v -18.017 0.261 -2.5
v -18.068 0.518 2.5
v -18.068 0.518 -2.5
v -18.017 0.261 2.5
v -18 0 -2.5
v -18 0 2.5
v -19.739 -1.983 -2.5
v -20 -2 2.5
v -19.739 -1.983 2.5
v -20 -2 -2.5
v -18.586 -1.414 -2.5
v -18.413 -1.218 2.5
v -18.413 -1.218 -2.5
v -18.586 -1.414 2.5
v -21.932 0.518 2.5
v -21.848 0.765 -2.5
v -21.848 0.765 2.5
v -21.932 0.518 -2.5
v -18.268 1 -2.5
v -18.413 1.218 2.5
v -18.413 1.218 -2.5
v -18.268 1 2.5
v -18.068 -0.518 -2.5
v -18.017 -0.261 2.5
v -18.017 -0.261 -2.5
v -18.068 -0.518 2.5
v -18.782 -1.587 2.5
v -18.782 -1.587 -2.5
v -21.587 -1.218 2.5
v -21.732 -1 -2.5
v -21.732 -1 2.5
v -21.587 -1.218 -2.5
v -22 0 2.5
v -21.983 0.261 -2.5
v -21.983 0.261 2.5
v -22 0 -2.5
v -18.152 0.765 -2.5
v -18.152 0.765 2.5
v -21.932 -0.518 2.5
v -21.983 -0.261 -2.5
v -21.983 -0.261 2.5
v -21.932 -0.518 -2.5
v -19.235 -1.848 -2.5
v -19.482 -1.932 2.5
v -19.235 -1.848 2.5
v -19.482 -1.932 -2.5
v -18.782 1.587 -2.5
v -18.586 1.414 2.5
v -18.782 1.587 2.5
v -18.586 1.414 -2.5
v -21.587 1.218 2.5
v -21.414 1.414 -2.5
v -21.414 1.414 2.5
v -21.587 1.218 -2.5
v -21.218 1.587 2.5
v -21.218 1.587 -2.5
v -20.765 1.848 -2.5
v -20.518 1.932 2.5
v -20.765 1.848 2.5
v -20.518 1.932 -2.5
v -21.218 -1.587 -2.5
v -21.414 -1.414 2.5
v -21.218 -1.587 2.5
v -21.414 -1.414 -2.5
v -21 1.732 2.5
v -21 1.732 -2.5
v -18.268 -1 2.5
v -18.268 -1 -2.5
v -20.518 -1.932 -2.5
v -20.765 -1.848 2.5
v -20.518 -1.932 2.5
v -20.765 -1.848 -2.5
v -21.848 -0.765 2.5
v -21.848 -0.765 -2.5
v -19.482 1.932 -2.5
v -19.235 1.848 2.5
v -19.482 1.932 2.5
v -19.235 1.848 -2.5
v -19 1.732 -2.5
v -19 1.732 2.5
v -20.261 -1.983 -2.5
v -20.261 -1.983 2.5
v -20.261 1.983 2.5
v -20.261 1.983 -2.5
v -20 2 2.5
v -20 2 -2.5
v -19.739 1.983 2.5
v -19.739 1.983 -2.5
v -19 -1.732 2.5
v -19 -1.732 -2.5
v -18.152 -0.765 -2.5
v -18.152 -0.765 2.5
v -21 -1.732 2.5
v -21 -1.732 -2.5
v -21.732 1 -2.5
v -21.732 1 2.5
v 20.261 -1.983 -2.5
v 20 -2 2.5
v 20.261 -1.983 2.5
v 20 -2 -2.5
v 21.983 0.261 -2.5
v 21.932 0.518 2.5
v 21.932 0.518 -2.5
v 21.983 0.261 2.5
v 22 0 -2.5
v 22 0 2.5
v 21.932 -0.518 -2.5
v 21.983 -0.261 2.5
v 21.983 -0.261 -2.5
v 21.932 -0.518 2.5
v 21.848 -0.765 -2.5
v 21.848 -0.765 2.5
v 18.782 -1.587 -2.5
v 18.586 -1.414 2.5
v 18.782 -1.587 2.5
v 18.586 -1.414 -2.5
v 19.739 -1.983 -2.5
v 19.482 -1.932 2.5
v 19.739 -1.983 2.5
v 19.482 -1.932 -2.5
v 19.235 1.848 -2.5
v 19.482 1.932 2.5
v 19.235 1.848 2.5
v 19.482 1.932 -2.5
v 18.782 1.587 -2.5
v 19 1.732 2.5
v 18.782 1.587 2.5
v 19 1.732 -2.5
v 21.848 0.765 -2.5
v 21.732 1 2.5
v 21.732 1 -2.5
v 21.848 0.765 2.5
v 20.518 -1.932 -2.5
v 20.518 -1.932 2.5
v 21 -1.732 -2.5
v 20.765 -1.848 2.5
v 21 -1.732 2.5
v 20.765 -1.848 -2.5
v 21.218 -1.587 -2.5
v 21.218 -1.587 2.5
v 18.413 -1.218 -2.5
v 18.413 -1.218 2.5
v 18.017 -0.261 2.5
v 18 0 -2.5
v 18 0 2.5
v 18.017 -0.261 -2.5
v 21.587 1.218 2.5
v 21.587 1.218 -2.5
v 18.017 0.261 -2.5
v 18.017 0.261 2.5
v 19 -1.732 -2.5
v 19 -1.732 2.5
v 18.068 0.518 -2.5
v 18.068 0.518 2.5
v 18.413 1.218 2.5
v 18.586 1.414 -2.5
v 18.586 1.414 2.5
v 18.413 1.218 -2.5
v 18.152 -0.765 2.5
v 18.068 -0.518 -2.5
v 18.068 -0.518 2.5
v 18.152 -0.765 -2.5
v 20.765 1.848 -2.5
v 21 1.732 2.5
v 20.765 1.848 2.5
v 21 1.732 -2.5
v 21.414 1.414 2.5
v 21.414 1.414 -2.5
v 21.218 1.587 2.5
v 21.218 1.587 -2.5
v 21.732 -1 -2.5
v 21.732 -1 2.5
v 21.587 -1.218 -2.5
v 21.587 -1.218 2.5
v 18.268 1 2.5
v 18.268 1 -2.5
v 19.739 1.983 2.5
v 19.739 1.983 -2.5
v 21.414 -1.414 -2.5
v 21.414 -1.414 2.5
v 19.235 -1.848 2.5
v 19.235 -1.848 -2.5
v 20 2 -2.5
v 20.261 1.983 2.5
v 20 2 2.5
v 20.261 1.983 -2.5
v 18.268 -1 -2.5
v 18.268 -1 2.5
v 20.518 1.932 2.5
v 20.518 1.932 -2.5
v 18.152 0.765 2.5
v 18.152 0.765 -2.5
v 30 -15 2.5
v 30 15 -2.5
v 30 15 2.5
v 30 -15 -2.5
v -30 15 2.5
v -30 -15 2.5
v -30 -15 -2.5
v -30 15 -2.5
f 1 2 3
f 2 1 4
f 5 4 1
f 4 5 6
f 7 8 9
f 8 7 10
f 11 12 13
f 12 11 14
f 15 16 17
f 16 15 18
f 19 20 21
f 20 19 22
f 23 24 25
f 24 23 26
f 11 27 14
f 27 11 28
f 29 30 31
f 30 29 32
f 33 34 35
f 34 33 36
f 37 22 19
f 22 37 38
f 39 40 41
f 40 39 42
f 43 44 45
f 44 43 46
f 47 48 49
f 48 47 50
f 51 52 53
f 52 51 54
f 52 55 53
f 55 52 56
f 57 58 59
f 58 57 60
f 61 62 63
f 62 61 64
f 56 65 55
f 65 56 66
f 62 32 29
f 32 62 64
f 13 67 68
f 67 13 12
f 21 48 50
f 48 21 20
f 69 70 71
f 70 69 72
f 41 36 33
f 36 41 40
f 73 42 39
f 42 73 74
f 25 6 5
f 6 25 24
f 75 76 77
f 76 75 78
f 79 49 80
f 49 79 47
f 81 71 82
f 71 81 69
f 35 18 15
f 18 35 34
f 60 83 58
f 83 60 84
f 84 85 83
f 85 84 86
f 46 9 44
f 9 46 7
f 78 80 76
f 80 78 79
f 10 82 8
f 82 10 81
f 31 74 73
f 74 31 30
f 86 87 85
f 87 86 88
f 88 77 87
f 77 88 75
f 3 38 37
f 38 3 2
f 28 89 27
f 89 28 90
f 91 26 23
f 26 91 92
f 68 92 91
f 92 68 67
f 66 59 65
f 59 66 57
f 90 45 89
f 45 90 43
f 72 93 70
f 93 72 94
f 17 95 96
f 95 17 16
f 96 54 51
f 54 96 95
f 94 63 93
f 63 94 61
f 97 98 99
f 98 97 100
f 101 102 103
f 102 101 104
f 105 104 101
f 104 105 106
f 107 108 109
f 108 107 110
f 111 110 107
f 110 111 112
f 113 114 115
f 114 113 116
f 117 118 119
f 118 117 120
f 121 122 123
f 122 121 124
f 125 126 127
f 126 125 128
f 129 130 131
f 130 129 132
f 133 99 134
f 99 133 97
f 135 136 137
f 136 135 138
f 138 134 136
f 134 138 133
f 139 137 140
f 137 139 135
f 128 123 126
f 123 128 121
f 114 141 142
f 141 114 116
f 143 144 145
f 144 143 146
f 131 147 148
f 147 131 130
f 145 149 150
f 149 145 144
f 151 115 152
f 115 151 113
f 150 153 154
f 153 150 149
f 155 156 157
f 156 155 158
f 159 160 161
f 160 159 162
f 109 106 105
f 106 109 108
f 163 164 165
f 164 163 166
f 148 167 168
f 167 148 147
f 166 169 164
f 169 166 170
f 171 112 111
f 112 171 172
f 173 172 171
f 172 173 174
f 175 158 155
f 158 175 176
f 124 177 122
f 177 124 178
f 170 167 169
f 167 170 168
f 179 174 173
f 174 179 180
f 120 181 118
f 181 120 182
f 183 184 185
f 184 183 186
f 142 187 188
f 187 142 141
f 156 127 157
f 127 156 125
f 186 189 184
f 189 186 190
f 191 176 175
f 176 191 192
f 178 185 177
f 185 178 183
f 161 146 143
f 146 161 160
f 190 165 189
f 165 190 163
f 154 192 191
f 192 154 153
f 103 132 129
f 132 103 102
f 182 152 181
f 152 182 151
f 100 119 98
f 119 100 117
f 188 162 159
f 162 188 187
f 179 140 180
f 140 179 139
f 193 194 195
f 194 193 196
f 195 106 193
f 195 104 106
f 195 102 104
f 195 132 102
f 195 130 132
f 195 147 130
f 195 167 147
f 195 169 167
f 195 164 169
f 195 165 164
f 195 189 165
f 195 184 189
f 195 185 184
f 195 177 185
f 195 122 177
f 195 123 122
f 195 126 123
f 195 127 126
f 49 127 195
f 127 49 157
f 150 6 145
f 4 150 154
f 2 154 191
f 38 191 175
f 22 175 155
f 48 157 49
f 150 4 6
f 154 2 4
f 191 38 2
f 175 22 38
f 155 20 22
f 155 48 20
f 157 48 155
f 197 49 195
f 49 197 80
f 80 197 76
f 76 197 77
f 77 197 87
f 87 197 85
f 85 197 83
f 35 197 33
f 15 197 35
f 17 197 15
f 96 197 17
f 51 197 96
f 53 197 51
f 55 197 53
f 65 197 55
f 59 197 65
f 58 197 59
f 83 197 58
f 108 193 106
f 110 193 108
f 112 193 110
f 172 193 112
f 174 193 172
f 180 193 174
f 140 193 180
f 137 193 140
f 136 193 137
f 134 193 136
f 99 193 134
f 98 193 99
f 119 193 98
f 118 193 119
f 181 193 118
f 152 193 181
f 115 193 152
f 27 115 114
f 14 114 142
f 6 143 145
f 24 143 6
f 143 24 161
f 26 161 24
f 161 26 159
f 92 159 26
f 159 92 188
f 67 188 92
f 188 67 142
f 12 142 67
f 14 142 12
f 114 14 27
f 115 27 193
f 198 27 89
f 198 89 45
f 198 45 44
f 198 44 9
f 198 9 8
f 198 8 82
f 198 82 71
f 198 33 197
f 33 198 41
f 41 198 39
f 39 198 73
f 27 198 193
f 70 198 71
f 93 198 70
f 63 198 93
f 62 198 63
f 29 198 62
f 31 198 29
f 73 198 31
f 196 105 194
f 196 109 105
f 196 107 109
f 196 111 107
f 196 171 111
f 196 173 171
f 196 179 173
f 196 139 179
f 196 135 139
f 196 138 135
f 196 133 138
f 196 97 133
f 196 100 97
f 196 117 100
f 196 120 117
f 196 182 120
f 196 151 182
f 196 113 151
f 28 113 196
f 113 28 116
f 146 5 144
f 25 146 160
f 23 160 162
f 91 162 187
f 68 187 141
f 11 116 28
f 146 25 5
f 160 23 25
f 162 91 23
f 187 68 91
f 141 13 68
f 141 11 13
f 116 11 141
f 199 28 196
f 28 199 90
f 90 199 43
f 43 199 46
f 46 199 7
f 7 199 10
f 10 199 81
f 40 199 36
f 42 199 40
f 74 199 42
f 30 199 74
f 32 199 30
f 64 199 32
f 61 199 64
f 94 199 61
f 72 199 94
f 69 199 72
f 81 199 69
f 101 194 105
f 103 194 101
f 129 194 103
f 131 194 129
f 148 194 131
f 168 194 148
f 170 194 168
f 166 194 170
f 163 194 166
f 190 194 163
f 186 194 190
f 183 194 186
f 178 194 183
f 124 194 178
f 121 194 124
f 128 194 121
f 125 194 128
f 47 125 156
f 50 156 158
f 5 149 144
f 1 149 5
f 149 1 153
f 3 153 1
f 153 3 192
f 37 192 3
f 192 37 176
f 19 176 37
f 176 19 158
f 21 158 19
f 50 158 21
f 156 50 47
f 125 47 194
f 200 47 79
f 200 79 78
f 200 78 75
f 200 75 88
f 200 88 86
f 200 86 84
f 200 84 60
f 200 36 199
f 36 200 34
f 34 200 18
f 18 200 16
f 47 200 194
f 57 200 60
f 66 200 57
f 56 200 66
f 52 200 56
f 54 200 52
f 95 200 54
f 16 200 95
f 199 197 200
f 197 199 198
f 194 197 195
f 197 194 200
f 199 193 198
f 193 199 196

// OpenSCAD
length = 60;
width = 30;
thickness = 5;
hole_diameter = 4;
hole_offset = 10;

difference() {
    cube([length, width, thickness], center = true);

    for (x = [-length / 2 + hole_offset, length / 2 - hole_offset]) {
        translate([x, 0, 0])
            cylinder(h = thickness + 1, d = hole_diameter, center = true, $fn = 48);
    }
}
